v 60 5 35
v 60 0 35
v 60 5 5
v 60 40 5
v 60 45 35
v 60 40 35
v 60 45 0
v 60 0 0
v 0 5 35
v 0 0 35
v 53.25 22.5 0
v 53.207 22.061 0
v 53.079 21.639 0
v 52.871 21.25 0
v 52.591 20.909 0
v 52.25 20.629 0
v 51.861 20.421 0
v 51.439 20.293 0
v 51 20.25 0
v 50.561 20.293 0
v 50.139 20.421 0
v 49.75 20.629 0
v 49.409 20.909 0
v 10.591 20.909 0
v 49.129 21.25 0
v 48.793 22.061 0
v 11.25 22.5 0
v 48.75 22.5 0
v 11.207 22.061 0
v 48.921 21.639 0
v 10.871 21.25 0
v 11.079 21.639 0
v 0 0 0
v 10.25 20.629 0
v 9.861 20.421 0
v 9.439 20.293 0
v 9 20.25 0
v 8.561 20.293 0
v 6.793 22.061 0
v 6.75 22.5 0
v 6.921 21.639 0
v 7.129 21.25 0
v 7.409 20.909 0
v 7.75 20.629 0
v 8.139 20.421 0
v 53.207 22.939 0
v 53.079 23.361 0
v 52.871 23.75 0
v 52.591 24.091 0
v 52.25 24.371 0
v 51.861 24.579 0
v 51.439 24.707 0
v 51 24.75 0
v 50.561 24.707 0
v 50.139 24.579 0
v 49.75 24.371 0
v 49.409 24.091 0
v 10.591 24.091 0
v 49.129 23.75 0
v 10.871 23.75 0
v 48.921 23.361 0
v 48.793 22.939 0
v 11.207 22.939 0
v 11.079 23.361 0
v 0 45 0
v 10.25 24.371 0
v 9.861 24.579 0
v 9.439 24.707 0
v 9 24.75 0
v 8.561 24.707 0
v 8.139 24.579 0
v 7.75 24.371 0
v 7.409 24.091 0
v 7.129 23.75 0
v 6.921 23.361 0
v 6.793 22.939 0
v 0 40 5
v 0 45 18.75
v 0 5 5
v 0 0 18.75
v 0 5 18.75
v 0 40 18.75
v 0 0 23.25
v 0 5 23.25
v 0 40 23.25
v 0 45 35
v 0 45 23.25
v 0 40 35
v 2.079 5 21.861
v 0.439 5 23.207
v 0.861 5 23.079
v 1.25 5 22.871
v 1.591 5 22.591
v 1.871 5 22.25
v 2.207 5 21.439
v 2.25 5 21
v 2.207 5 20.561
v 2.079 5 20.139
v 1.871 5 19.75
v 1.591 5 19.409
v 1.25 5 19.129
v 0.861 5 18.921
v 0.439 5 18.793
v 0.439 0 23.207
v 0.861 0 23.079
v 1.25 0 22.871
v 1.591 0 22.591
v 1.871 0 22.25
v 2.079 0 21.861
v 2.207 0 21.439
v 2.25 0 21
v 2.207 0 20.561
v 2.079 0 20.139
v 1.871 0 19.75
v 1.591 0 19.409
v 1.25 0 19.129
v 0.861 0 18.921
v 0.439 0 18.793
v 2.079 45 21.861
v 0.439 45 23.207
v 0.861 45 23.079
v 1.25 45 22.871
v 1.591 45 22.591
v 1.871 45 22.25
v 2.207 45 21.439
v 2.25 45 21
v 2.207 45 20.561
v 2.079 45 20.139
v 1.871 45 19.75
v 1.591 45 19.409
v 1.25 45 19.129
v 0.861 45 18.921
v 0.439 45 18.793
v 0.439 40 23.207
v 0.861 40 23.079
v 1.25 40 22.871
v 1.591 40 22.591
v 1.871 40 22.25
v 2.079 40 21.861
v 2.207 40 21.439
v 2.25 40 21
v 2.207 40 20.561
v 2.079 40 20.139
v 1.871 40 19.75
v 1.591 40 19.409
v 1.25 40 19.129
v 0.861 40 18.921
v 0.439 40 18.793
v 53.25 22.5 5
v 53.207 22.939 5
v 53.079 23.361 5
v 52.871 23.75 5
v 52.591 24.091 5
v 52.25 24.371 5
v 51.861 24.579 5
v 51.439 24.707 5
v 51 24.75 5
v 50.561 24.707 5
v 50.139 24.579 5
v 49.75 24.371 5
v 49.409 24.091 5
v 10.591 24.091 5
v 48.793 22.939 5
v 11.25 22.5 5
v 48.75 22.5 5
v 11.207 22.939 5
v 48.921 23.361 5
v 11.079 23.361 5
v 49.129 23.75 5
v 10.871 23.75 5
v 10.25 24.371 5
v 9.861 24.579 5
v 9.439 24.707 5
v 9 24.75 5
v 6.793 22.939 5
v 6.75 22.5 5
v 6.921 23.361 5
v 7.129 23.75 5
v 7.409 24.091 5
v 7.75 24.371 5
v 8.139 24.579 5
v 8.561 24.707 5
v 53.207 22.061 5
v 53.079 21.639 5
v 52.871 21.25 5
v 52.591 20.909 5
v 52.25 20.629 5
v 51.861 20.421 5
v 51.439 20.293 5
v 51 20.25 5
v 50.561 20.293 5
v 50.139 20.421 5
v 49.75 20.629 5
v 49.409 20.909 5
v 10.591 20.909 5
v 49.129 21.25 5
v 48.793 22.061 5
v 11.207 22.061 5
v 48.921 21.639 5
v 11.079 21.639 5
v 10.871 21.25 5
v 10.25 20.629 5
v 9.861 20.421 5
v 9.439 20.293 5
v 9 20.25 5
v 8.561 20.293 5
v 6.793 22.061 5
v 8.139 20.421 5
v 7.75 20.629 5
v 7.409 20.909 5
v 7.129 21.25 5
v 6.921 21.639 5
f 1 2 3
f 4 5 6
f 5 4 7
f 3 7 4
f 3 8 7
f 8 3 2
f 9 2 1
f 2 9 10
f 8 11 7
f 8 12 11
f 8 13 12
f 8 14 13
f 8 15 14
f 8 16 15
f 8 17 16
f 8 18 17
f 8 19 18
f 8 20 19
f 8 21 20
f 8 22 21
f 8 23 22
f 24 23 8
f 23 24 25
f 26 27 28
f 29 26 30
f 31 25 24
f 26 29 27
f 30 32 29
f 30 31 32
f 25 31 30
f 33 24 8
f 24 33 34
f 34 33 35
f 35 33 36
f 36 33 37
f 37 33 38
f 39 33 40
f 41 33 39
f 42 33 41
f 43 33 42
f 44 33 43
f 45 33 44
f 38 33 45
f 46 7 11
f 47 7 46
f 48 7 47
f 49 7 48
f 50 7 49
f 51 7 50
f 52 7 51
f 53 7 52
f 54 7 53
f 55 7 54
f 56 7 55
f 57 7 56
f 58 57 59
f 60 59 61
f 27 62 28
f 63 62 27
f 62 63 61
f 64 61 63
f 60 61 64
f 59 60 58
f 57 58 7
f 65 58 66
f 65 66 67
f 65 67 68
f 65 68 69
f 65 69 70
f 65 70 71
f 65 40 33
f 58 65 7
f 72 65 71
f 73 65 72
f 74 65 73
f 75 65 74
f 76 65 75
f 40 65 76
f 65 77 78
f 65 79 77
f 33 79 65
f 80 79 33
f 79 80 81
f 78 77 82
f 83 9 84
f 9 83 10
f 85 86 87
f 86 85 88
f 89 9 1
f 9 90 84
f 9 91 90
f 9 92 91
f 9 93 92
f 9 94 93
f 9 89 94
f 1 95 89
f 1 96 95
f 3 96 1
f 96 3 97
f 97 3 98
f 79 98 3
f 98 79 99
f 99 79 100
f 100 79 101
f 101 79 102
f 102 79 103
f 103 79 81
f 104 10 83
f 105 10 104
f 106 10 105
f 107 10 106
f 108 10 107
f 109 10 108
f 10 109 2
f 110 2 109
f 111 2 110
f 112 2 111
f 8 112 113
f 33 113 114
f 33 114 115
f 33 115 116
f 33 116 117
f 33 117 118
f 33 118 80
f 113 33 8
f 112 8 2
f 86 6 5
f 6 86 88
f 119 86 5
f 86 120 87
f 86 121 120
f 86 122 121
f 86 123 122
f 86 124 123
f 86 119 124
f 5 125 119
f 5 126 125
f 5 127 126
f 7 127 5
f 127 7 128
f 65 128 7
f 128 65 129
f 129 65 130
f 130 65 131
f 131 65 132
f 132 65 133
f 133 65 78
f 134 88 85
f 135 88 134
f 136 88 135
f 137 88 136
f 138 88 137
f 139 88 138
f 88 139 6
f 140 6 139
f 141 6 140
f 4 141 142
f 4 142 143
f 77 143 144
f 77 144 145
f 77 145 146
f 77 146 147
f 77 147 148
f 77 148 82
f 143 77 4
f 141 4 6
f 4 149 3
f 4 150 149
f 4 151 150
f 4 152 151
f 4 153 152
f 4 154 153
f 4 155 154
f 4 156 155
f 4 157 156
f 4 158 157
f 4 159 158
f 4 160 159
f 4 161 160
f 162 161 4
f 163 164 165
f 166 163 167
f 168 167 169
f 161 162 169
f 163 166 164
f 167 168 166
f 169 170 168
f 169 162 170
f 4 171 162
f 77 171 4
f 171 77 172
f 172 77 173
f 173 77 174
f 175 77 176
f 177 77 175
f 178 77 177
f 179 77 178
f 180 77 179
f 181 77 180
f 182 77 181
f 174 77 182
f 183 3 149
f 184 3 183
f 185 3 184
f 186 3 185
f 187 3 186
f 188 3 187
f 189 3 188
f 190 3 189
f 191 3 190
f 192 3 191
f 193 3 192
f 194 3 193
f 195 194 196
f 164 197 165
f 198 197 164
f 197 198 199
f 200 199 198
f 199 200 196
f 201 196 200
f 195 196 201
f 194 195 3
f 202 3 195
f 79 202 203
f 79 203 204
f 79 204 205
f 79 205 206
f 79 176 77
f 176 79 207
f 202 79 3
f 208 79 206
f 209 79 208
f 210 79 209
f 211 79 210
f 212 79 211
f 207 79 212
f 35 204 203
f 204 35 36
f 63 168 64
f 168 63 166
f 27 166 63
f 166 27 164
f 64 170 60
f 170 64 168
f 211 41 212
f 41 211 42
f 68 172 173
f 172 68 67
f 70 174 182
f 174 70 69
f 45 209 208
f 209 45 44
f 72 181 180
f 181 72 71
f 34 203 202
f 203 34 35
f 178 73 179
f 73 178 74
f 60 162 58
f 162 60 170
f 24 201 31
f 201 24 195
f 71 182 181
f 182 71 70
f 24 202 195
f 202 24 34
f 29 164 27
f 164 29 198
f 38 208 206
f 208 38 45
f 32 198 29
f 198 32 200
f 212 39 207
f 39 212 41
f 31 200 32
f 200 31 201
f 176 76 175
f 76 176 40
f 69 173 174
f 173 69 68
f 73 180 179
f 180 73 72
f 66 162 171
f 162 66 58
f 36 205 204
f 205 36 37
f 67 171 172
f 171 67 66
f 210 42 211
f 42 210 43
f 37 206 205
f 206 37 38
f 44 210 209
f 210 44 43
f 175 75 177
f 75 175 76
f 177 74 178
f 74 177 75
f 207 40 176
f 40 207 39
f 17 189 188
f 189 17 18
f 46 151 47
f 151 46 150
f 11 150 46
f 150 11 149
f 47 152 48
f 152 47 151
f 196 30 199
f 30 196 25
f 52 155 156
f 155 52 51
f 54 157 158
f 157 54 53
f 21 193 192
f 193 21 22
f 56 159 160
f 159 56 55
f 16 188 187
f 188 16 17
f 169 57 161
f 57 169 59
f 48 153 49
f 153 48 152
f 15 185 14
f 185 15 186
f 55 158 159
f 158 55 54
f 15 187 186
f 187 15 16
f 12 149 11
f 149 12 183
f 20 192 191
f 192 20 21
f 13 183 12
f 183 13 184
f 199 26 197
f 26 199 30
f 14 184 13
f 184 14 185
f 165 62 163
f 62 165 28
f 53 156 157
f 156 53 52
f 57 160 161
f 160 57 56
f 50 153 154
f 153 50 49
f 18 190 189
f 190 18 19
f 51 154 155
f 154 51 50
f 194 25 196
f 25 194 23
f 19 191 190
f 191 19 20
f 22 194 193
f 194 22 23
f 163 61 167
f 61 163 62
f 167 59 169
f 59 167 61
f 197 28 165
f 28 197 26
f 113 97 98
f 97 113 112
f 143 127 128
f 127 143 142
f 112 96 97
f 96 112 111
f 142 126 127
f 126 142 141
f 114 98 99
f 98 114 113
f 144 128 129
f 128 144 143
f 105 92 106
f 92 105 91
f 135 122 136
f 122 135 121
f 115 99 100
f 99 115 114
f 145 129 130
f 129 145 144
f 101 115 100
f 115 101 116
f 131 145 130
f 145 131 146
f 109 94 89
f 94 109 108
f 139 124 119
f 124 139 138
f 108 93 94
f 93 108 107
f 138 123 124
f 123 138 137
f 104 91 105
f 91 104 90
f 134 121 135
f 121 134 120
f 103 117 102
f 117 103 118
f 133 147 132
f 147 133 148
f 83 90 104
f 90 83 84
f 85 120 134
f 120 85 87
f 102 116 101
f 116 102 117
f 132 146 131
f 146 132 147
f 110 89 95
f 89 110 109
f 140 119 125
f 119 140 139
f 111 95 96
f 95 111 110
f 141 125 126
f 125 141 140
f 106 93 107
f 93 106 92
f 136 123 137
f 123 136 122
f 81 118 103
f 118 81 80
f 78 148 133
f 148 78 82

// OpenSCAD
$fn = 32;

// ----------------------------------------------------------------------
// U-bracket: 60 x 45 x 35 mm
// ----------------------------------------------------------------------

// --- parameters (mm) ---
base_len = 60;            // outer length, X
channel_w = 45;           // outer width, Y
upright_h = 35;           // upright height, Z
mat_t = 5;                // wall thickness
hole_d = 4.5;             // clearance for M4

module hole_z(px, py) {
  translate([px, py, -2.5]) cylinder(h = mat_t + 5, d = hole_d);
}
module hole_y_pz(pz) {
  /* through both uprights along Y */
  translate([0, -2.5, pz]) rotate([-90, 0, 0]) cylinder(h = channel_w + 5, d = hole_d);
}

module base() {
  cube([base_len, channel_w, mat_t]);
}

module uprights() {
  cube([base_len, mat_t, upright_h]);
  translate([0, channel_w - mat_t, 0]) cube([base_len, mat_t, upright_h]);
}

difference() {
  union() {
    base();
    uprights();
  }
  hole_z(9, 22.5);
  hole_z(51, 22.5);
  hole_y_pz(21);
}
